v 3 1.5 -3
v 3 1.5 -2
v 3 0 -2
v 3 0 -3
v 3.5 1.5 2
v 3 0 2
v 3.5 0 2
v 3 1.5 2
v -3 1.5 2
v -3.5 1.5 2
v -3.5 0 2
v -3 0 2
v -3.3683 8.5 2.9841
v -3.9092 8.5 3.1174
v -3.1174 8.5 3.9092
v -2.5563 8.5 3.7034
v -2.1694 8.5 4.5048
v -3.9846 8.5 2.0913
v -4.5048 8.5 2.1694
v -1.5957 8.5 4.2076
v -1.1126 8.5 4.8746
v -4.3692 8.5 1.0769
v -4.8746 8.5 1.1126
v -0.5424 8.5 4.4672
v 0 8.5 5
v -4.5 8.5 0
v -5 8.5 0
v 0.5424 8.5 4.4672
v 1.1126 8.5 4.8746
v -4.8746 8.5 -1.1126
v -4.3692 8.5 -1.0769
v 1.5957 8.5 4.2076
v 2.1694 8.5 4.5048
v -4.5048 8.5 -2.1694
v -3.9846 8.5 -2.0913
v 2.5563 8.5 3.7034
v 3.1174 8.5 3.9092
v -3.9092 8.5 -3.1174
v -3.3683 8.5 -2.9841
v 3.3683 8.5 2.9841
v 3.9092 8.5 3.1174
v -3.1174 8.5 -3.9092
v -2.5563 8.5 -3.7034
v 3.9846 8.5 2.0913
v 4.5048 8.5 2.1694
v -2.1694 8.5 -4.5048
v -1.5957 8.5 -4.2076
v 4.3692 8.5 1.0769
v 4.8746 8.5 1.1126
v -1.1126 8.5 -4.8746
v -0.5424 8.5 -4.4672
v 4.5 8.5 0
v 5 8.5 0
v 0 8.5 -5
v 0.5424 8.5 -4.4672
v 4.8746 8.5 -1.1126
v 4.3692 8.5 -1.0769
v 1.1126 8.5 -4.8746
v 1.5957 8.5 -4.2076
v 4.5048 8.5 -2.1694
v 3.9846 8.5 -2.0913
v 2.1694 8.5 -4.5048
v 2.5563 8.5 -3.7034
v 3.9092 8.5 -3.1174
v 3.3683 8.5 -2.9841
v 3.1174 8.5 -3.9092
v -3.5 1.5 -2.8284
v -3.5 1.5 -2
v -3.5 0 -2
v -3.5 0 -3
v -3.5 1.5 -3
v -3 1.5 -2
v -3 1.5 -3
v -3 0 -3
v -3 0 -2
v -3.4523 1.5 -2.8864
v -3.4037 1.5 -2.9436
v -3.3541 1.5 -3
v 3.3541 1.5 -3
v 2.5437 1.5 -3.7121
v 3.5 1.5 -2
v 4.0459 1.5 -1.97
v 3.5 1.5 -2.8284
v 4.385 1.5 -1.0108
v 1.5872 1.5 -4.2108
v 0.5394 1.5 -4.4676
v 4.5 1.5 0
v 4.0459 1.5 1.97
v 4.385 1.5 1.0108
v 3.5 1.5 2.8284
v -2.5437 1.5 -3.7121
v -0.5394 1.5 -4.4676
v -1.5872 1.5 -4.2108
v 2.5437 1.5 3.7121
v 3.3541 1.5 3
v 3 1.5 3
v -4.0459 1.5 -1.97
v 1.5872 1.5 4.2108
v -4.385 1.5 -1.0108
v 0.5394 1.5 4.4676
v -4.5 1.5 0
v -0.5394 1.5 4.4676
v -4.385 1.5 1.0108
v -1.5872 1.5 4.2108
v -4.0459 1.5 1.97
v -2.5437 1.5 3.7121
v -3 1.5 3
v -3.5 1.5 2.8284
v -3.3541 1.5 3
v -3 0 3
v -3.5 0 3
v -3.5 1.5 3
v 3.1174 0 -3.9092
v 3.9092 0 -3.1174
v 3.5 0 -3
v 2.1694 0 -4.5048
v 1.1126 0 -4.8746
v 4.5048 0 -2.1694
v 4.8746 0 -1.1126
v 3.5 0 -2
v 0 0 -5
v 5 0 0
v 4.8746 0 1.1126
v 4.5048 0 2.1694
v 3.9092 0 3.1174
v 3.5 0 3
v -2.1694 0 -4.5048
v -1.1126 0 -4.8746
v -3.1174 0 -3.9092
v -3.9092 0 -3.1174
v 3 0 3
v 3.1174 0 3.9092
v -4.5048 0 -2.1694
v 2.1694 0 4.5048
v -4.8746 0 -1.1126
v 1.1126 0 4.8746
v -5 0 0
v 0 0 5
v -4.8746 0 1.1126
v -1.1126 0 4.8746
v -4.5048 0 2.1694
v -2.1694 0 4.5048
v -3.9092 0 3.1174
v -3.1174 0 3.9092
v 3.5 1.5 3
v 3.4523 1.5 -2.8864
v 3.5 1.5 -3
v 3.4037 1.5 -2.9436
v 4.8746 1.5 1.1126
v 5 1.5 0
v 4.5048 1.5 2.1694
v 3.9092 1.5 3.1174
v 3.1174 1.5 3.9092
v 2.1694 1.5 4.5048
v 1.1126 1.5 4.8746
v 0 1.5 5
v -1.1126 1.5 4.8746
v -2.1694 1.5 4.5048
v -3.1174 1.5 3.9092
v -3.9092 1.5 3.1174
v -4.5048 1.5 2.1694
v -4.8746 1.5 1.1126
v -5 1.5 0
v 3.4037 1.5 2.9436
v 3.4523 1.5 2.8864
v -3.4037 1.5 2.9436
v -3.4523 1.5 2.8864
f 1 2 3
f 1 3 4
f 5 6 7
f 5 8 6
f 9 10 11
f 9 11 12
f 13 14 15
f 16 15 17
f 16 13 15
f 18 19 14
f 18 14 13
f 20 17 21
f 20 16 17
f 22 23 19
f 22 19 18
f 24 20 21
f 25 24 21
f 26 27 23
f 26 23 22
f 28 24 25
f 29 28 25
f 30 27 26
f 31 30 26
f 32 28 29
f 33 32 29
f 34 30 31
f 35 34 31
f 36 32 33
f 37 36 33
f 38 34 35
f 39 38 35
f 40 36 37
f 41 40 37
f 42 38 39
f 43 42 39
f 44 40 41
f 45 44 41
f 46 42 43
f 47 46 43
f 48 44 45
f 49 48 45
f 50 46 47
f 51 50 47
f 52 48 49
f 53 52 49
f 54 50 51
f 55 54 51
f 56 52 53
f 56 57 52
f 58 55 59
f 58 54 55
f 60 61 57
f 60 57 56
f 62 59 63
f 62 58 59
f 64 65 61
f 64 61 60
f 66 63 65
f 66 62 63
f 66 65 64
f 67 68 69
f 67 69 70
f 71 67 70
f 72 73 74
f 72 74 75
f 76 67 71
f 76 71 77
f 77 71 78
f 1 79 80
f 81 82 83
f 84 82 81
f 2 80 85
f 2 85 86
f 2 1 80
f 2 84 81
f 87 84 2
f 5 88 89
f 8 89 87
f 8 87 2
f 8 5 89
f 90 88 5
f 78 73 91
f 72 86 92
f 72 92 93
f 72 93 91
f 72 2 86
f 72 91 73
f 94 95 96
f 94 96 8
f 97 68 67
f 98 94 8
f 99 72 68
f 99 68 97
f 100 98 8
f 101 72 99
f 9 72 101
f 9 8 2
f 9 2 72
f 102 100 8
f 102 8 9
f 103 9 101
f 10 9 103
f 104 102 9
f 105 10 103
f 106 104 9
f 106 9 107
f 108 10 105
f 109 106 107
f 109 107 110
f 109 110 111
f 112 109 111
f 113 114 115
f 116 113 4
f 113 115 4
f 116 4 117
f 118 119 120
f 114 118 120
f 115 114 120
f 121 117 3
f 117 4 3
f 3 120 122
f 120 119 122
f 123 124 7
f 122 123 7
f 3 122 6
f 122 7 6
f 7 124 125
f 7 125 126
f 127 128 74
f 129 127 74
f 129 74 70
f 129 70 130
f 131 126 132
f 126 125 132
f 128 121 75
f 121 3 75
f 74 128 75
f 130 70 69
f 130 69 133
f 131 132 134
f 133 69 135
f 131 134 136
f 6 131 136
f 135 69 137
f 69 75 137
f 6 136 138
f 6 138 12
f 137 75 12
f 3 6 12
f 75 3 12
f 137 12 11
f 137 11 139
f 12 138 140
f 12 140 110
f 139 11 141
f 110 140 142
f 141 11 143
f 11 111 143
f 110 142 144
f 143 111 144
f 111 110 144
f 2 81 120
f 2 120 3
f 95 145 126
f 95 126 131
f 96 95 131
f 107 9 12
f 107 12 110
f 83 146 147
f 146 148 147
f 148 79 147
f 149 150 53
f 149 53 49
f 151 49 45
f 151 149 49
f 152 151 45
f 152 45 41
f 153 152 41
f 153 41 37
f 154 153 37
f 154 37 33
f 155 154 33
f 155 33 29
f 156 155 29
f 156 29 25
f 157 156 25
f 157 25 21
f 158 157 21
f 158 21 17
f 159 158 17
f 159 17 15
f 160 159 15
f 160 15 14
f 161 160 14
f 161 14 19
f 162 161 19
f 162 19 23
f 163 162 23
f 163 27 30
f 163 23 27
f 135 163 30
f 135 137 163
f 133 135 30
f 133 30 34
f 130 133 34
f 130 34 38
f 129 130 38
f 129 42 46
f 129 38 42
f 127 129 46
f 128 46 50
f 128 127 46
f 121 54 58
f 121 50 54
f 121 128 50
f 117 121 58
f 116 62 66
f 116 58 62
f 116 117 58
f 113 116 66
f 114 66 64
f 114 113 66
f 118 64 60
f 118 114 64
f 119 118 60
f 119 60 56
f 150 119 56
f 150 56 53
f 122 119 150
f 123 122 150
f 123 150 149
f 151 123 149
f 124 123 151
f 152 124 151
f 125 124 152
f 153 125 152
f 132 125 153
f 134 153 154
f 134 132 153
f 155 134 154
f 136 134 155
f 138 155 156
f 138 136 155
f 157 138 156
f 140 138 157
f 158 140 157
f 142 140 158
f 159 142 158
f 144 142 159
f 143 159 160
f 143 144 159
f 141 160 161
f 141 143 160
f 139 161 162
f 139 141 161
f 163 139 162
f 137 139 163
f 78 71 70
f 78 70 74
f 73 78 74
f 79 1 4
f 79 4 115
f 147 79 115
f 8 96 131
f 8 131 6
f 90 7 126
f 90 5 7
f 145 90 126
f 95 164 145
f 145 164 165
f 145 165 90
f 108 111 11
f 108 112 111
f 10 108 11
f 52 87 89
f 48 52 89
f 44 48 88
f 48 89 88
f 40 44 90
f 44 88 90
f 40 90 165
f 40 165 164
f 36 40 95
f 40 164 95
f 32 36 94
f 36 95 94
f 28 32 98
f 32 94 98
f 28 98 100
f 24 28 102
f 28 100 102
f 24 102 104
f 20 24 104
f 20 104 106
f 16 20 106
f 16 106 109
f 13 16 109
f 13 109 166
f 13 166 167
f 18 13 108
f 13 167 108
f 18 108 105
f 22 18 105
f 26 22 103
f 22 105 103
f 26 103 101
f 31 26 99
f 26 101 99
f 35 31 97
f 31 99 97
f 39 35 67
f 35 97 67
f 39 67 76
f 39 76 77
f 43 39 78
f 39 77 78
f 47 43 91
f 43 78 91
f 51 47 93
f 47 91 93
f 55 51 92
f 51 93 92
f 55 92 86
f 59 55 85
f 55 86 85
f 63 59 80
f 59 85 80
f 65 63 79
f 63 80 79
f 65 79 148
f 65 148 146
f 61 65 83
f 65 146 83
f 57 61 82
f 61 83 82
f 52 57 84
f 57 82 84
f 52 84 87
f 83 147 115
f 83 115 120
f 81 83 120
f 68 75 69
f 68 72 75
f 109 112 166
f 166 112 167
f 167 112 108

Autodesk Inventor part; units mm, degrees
ref_plane "YZ Plane" through (0, 0, 0) normal (1, 0, 0) x (0, 1, 0)
ref_plane "XZ Plane" through (0, 0, 0) normal (0, 1, 0) x (-1, 0, 0)
ref_plane "XY Plane" through (0, 0, 0) normal (0, 0, 1) x (1, 0, 0)
sketch "Sketch1" plane through (0, 0, 0) normal (0, 1, 0) x (-1, 0, 0)
  circle A0 centre (0, 0) radius 5
  dimension "d0" = 10
sketch "Sketch2" plane through (0, 0, 0) normal (0, 1, 0) x (-1, 0, 0)
  point P0 (0, 0)
extrude "Extrusion1" add sketch "Sketch1" along normal blind 1.5
sketch "Sketch3" plane through (0, 1.5, 0) normal (0, 1, 0) x (1, 0, 0)
  circle A0 centre (0, 0) radius 4.5
  circle A1 centre (0, 0) radius 5
  dimension "d3" = 9
extrude "Extrusion2" add sketch "Sketch3" along normal blind 7
sketch "Sketch4" plane through (0, 1.5, 0) normal (0, 1, 0) x (1, 0, 0)
  line L0 (3, 3) -> (3.5, 3)
  line L1 (3.5, 3) -> (3.5, 2)
  line L2 (3.5, 2) -> (3, 2)
  line L3 (3, 2) -> (3, 3)
  line L4 (3, 3) -> (3.5, 2) construction
  line L5 (3.5, 3) -> (3, 2) construction
  line L6 (-3.5, 3) -> (-3, 3)
  line L7 (-3, 3) -> (-3, 2)
  line L8 (-3, 2) -> (-3.5, 2)
  line L9 (-3.5, 2) -> (-3.5, 3)
  line L10 (-3.5, 3) -> (-3, 2) construction
  line L11 (-3, 3) -> (-3.5, 2) construction
  line L12 (-3.5, -2) -> (-3, -2)
  line L13 (-3, -2) -> (-3, -3)
  line L14 (-3, -3) -> (-3.5, -3)
  line L15 (-3.5, -3) -> (-3.5, -2)
  line L16 (-3.5, -2) -> (-3, -3) construction
  line L17 (-3, -2) -> (-3.5, -3) construction
  line L18 (3, -2) -> (3.5, -2)
  line L19 (3.5, -2) -> (3.5, -3)
  line L20 (3.5, -3) -> (3, -3)
  line L21 (3, -3) -> (3, -2)
  point P0 (0, 0)
  point P1 (3.25, 2.5)
  point P2 (-3.25, 2.5)
  point P3 (-3.25, -2.5)
  dimension "d8" = 0.5
  dimension "d9" = 1
  dimension "d10" = 0.5
  dimension "d11" = 1
  dimension "d12" = 0.5
  dimension "d13" = 1
  dimension "d15" = 6
  dimension "d16" = 7
  dimension "d17" = 0
  dimension "d18" = 0
  dimension "d20" = 0.5
  dimension "d21" = 1
  dimension "d22" = 7
  dimension "d23" = 0
  dimension "d24" = 3.5
  dimension "d26" = 3
extrude "Extrusion3" cut sketch "Sketch4" against normal blind 7
properties part number "button_bottom"
